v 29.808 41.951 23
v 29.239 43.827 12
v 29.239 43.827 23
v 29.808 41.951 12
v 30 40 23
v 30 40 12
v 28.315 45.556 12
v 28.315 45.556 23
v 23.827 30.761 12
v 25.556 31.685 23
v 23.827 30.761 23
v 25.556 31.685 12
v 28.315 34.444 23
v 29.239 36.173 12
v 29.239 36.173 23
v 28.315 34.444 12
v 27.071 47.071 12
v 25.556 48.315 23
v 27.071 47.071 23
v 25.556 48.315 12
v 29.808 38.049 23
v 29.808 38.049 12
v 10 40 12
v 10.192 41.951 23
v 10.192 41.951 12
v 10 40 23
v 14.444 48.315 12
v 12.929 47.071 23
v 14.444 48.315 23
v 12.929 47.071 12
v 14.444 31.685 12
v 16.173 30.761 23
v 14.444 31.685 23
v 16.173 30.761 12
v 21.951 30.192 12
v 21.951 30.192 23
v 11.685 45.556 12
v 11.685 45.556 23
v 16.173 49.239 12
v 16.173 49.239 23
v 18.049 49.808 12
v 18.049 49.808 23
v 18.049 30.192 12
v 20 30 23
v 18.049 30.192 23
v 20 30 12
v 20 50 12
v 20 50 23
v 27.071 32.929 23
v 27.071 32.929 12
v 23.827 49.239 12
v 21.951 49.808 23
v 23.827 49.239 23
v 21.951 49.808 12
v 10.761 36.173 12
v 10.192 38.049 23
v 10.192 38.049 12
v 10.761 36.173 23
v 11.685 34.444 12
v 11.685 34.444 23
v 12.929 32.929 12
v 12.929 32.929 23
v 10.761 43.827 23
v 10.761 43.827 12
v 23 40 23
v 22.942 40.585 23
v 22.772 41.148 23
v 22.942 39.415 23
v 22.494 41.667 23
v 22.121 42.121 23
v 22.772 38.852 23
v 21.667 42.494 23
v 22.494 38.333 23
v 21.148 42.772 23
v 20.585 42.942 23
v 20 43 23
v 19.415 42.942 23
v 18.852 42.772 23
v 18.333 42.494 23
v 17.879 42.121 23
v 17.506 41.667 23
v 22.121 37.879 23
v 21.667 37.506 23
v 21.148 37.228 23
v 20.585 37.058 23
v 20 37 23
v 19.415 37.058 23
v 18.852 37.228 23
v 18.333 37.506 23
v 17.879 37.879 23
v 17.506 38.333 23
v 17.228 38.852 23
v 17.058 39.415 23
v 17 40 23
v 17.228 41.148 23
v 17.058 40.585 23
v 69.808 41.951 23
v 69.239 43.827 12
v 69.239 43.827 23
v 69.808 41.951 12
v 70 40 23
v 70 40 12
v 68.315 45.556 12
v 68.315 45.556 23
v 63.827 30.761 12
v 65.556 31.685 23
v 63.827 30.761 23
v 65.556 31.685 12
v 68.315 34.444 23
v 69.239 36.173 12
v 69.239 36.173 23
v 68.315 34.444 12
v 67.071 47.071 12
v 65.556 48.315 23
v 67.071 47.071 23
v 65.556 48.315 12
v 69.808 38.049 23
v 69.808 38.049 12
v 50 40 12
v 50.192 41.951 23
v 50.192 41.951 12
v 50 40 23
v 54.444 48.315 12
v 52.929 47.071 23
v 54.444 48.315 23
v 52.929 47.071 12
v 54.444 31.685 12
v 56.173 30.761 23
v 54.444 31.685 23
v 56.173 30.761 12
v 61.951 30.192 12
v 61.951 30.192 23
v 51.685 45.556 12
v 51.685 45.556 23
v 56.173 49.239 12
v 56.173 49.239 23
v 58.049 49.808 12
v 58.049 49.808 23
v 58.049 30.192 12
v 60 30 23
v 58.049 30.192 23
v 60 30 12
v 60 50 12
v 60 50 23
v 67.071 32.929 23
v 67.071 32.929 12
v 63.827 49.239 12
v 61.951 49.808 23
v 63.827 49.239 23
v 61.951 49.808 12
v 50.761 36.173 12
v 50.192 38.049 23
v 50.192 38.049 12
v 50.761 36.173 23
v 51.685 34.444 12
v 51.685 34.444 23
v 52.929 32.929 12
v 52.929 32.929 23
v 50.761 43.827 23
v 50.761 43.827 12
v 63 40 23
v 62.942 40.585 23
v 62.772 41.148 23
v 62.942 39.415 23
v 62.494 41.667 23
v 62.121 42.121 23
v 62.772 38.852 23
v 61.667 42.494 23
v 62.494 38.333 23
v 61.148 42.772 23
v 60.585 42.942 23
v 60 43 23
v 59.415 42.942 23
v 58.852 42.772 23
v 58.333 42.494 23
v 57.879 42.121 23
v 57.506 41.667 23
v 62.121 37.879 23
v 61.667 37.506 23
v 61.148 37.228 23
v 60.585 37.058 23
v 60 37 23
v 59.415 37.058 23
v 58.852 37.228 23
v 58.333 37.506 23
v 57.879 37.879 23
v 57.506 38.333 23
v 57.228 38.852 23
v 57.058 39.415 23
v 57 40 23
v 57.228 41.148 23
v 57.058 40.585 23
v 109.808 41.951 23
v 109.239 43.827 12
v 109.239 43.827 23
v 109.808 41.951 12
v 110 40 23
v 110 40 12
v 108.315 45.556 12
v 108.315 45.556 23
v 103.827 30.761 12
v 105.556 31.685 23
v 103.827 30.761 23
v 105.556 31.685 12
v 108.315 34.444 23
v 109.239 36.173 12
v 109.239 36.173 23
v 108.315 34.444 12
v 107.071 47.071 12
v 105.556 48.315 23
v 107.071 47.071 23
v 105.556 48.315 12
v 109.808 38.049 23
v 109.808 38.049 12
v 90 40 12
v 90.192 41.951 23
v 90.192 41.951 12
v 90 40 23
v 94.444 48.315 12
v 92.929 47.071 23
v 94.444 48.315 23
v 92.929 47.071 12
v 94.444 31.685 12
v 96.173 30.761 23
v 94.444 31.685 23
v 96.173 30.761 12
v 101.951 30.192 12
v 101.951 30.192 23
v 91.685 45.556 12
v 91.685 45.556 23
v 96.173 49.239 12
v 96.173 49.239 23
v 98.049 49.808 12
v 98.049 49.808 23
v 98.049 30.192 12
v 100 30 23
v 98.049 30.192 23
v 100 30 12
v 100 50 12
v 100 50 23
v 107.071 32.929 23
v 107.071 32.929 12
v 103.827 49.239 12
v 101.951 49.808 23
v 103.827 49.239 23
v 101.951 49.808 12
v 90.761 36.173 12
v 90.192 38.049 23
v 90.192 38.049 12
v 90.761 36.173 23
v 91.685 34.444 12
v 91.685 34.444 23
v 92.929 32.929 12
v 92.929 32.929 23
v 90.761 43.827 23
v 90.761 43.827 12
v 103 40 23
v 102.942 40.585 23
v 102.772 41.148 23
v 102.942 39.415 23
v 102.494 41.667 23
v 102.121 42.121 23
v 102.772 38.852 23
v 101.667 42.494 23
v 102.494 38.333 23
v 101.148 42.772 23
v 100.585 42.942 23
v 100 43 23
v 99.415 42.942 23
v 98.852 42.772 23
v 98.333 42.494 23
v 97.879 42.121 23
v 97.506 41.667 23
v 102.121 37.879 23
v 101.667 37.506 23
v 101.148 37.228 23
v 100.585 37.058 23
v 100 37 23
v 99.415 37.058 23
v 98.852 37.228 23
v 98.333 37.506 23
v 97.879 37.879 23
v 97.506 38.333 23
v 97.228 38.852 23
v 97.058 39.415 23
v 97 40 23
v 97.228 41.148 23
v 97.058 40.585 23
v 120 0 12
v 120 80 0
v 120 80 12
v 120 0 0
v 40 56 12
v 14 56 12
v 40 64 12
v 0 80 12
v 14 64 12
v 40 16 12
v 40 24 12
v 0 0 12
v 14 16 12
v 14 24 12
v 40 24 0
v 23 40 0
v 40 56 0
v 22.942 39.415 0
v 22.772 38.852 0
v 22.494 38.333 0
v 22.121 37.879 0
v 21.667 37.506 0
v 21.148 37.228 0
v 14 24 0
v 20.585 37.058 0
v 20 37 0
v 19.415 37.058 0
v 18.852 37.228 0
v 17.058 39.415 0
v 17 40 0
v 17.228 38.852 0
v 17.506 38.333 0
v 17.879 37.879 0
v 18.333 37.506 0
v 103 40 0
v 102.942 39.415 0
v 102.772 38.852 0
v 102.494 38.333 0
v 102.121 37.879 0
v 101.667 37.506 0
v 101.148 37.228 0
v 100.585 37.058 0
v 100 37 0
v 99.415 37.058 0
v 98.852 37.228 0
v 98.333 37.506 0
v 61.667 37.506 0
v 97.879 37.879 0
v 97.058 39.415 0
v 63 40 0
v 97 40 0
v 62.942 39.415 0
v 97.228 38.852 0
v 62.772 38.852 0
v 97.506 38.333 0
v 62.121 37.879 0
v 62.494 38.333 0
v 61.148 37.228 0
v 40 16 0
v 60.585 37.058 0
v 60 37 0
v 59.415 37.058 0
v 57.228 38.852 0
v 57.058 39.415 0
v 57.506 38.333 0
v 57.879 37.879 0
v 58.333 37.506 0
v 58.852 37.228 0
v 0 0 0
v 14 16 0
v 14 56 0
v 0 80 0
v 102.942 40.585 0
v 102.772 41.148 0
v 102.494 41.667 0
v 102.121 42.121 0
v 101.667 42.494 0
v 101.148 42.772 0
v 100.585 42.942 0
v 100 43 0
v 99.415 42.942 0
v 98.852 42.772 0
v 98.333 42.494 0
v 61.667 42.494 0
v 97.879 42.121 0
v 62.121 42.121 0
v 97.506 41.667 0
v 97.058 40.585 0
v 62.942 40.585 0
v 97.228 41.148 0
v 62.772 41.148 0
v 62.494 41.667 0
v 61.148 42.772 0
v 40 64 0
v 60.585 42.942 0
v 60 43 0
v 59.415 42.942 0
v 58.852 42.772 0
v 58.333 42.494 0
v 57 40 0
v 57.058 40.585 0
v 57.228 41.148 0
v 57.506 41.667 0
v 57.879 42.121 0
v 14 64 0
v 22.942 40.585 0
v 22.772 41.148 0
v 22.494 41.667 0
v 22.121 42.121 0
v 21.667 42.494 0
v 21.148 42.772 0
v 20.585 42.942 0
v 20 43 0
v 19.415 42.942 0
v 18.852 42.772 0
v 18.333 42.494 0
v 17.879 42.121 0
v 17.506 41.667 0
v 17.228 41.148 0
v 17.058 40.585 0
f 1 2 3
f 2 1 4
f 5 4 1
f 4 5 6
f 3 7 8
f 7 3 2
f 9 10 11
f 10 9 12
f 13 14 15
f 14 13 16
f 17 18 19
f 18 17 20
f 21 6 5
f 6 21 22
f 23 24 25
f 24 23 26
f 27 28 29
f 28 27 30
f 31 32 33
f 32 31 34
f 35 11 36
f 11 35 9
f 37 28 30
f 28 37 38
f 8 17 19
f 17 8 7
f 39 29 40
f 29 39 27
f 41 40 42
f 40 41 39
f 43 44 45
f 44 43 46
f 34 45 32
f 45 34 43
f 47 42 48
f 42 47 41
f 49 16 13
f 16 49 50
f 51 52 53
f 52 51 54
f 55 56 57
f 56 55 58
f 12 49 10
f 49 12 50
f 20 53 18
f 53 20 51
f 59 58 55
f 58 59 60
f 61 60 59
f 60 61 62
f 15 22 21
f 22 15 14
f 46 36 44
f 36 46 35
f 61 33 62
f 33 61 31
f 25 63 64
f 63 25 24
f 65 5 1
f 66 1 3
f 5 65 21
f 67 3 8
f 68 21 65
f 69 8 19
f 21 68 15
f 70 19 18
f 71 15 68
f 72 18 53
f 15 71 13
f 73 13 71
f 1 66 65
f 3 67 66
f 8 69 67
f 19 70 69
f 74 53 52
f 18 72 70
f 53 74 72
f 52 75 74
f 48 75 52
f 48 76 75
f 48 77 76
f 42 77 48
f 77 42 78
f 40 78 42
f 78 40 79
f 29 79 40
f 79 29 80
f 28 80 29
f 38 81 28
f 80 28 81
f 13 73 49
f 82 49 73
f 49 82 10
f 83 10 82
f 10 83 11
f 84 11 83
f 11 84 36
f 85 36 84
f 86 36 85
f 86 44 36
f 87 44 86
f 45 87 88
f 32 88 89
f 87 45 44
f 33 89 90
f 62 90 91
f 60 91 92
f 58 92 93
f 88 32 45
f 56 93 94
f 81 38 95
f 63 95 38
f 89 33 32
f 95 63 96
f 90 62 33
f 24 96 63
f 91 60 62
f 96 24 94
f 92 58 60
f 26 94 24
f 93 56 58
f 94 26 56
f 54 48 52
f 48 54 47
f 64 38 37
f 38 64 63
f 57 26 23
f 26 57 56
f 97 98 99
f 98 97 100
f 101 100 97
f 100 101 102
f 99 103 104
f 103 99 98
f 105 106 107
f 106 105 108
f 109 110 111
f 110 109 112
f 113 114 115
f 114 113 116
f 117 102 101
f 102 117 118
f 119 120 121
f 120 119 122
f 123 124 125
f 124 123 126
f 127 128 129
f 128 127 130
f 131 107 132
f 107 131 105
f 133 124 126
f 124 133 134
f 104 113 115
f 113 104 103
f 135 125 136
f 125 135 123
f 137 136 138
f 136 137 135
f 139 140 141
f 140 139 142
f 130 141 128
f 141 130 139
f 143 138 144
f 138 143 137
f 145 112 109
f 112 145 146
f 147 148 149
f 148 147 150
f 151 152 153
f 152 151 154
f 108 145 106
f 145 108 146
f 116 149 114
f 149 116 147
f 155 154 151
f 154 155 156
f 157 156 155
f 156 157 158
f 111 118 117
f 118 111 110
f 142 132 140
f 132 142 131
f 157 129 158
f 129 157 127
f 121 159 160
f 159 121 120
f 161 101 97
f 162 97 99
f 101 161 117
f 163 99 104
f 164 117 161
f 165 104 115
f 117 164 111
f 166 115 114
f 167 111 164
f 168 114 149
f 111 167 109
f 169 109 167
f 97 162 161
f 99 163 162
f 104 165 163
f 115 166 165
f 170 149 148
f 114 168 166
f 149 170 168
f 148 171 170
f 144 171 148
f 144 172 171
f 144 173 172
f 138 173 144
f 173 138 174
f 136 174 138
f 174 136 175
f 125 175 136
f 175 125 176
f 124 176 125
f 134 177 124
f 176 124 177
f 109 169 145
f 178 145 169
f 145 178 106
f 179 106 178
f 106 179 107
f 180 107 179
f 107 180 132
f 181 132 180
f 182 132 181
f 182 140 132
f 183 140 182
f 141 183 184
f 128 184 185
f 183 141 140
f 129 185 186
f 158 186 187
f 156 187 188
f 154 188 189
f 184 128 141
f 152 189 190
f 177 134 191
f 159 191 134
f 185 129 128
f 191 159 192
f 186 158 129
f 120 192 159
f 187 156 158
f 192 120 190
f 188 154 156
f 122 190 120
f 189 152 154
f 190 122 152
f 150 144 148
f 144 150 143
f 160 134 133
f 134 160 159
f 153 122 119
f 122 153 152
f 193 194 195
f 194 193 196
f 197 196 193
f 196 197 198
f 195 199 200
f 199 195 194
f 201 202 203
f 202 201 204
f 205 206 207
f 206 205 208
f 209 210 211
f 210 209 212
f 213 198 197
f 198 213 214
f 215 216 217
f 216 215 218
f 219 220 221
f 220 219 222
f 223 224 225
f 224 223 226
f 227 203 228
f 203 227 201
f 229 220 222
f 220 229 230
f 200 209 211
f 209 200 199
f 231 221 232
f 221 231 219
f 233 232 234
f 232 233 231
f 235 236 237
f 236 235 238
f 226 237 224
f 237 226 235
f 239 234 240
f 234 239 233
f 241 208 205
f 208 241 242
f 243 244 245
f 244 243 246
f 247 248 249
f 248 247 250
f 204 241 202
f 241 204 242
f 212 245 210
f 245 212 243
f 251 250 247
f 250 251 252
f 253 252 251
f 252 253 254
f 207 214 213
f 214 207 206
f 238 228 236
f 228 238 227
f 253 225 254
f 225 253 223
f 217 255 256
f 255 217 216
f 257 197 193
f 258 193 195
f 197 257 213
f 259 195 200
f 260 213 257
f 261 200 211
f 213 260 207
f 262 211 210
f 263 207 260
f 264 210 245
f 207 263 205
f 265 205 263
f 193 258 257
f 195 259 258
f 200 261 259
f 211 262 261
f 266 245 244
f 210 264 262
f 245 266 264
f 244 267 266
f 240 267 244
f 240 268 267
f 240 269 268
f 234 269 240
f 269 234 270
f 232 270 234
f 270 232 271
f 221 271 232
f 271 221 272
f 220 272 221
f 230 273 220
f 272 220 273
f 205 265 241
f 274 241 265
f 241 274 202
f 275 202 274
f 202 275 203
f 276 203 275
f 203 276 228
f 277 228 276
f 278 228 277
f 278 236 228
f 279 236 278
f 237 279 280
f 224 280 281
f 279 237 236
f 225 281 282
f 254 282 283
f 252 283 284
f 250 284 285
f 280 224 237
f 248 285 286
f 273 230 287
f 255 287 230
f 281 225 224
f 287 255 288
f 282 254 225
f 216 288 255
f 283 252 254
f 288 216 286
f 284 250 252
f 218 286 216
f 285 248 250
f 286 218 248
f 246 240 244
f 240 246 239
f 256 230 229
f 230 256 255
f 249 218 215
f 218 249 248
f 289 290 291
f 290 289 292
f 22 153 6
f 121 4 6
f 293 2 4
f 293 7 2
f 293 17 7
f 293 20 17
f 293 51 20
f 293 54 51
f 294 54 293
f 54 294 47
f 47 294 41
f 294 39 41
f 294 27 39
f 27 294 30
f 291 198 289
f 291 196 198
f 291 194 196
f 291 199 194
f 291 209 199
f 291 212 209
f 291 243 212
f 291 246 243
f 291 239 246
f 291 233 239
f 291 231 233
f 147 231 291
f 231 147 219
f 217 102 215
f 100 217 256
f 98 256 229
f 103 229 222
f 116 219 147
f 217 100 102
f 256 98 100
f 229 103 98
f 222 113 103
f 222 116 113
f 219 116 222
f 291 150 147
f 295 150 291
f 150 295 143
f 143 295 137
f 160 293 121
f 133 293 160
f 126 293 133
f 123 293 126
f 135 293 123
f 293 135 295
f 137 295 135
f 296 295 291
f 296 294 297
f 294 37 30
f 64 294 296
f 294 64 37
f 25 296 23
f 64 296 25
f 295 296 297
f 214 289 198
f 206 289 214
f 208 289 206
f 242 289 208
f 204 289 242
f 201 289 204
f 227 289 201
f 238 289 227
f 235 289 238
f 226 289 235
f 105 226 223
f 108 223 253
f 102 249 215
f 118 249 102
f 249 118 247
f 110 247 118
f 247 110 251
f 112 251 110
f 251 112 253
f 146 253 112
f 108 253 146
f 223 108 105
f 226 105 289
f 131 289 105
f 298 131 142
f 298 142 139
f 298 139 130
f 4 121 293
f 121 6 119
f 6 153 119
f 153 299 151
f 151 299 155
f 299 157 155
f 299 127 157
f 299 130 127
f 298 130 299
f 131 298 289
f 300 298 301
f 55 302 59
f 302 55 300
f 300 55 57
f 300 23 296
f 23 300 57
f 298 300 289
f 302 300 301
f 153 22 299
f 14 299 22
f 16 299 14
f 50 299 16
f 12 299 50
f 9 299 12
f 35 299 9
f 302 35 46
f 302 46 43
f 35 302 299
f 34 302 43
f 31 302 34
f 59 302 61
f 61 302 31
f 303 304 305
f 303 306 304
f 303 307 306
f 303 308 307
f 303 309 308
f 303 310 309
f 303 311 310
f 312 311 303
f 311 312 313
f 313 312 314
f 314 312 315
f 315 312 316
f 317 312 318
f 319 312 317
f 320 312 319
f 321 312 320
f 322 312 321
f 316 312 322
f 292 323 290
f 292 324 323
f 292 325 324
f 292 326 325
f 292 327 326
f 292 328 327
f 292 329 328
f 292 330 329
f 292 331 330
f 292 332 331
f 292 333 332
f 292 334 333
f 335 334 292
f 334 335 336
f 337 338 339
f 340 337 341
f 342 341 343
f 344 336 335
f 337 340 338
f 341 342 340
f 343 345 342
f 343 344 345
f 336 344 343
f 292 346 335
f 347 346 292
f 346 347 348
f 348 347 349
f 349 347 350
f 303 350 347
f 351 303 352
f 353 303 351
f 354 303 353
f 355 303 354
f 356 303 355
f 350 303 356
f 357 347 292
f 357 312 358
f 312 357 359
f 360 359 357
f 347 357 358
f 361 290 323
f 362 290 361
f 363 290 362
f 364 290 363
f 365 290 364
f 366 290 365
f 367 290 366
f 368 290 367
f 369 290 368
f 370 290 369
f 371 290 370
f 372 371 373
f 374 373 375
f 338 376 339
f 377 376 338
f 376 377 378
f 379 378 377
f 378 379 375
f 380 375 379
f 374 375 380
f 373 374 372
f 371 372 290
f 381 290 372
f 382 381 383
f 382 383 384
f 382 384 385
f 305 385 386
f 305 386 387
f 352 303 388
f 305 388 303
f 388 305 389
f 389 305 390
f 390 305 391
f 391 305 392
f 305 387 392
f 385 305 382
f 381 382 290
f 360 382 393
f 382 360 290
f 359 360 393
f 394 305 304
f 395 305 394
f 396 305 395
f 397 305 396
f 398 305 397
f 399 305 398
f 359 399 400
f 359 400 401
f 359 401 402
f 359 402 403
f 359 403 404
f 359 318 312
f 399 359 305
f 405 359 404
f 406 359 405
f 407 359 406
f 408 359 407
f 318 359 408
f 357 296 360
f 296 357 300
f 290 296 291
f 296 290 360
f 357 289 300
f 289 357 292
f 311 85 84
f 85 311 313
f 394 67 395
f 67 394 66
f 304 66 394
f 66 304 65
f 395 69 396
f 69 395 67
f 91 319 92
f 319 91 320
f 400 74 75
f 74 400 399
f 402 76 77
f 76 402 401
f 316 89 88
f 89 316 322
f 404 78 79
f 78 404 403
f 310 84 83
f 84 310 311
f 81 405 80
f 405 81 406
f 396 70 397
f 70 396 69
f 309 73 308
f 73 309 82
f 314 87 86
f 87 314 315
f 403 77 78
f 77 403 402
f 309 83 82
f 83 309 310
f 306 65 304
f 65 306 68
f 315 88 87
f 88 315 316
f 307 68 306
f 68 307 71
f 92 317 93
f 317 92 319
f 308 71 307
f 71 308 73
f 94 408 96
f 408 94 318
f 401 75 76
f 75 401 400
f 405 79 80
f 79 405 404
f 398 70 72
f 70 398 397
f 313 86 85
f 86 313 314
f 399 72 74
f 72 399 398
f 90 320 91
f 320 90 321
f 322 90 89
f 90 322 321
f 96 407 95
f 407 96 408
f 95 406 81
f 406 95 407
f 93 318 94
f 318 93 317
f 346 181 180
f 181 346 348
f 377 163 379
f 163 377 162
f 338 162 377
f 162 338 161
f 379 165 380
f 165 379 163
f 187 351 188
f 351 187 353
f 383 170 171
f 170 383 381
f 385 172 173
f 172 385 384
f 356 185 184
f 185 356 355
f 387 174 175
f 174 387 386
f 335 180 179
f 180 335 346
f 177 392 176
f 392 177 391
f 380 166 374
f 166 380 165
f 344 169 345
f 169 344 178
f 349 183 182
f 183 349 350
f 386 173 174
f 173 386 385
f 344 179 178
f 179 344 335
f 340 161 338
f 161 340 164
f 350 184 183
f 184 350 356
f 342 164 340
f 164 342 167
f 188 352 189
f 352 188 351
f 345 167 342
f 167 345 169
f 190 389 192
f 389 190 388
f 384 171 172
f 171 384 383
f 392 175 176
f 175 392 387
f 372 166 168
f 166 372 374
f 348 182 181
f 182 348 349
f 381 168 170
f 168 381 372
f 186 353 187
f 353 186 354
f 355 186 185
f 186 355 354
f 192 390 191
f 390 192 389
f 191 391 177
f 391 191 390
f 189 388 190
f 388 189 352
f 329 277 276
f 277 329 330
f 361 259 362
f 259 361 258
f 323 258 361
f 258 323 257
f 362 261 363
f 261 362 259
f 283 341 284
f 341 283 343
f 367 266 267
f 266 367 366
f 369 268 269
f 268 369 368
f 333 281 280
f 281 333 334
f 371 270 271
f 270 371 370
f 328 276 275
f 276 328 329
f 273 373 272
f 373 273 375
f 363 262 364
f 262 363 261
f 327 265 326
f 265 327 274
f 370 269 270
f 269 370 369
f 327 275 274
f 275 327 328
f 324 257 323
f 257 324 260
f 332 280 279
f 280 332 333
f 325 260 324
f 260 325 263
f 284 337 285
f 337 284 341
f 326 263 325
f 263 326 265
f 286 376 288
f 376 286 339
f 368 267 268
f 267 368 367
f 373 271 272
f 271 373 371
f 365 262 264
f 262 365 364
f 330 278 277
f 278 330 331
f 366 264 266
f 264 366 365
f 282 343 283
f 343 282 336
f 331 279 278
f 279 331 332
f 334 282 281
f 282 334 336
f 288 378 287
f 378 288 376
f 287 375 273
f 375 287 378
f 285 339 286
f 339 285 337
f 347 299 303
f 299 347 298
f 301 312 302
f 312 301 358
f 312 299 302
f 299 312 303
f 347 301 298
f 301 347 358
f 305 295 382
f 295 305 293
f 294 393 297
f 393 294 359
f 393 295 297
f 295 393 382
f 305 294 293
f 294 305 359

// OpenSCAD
$fn = 32;

// ----------------------------------------------------------------------
// Drill jig: three_boss_slot jig
// ----------------------------------------------------------------------

// --- parameters (mm) ---
plate_l = 120;            // plate length, X
plate_w = 80;             // plate width, Y
plate_t = 12;             // plate thickness
boss_d = 20;              // guide boss diameter
boss_h = 12;              // boss height above the plate
guide_d = 6;              // guide hole diameter
boss_pitch = 40;          // boss pitch
slot_w = 8;               // clamp slot width
slot_l = 26;              // clamp slot length
slot_x = 14;              // slot start X

n_boss = 3;  // guide bosses
boss_x0 = (plate_l - (n_boss - 1) * boss_pitch) / 2;  // first boss X
boss_top = plate_t - 1 + boss_h;  // boss crown height
total_h = boss_top;  // overall height

difference() {
  union() {
  cube([plate_l, plate_w, plate_t]);
  for (i = [0 : n_boss - 1])
    translate([boss_x0 + i * boss_pitch, plate_w / 2, plate_t - 1])
      cylinder(h = boss_h, d = boss_d);
  }
  for (i = [0 : n_boss - 1])
    translate([boss_x0 + i * boss_pitch, plate_w / 2, -1])
      cylinder(h = plate_t + boss_h, d = guide_d);
  for (cy = [plate_w * 0.25, plate_w * 0.75])
    translate([slot_x, cy - slot_w / 2, -1])
      cube([slot_l, slot_w, plate_t + 2]);
}
